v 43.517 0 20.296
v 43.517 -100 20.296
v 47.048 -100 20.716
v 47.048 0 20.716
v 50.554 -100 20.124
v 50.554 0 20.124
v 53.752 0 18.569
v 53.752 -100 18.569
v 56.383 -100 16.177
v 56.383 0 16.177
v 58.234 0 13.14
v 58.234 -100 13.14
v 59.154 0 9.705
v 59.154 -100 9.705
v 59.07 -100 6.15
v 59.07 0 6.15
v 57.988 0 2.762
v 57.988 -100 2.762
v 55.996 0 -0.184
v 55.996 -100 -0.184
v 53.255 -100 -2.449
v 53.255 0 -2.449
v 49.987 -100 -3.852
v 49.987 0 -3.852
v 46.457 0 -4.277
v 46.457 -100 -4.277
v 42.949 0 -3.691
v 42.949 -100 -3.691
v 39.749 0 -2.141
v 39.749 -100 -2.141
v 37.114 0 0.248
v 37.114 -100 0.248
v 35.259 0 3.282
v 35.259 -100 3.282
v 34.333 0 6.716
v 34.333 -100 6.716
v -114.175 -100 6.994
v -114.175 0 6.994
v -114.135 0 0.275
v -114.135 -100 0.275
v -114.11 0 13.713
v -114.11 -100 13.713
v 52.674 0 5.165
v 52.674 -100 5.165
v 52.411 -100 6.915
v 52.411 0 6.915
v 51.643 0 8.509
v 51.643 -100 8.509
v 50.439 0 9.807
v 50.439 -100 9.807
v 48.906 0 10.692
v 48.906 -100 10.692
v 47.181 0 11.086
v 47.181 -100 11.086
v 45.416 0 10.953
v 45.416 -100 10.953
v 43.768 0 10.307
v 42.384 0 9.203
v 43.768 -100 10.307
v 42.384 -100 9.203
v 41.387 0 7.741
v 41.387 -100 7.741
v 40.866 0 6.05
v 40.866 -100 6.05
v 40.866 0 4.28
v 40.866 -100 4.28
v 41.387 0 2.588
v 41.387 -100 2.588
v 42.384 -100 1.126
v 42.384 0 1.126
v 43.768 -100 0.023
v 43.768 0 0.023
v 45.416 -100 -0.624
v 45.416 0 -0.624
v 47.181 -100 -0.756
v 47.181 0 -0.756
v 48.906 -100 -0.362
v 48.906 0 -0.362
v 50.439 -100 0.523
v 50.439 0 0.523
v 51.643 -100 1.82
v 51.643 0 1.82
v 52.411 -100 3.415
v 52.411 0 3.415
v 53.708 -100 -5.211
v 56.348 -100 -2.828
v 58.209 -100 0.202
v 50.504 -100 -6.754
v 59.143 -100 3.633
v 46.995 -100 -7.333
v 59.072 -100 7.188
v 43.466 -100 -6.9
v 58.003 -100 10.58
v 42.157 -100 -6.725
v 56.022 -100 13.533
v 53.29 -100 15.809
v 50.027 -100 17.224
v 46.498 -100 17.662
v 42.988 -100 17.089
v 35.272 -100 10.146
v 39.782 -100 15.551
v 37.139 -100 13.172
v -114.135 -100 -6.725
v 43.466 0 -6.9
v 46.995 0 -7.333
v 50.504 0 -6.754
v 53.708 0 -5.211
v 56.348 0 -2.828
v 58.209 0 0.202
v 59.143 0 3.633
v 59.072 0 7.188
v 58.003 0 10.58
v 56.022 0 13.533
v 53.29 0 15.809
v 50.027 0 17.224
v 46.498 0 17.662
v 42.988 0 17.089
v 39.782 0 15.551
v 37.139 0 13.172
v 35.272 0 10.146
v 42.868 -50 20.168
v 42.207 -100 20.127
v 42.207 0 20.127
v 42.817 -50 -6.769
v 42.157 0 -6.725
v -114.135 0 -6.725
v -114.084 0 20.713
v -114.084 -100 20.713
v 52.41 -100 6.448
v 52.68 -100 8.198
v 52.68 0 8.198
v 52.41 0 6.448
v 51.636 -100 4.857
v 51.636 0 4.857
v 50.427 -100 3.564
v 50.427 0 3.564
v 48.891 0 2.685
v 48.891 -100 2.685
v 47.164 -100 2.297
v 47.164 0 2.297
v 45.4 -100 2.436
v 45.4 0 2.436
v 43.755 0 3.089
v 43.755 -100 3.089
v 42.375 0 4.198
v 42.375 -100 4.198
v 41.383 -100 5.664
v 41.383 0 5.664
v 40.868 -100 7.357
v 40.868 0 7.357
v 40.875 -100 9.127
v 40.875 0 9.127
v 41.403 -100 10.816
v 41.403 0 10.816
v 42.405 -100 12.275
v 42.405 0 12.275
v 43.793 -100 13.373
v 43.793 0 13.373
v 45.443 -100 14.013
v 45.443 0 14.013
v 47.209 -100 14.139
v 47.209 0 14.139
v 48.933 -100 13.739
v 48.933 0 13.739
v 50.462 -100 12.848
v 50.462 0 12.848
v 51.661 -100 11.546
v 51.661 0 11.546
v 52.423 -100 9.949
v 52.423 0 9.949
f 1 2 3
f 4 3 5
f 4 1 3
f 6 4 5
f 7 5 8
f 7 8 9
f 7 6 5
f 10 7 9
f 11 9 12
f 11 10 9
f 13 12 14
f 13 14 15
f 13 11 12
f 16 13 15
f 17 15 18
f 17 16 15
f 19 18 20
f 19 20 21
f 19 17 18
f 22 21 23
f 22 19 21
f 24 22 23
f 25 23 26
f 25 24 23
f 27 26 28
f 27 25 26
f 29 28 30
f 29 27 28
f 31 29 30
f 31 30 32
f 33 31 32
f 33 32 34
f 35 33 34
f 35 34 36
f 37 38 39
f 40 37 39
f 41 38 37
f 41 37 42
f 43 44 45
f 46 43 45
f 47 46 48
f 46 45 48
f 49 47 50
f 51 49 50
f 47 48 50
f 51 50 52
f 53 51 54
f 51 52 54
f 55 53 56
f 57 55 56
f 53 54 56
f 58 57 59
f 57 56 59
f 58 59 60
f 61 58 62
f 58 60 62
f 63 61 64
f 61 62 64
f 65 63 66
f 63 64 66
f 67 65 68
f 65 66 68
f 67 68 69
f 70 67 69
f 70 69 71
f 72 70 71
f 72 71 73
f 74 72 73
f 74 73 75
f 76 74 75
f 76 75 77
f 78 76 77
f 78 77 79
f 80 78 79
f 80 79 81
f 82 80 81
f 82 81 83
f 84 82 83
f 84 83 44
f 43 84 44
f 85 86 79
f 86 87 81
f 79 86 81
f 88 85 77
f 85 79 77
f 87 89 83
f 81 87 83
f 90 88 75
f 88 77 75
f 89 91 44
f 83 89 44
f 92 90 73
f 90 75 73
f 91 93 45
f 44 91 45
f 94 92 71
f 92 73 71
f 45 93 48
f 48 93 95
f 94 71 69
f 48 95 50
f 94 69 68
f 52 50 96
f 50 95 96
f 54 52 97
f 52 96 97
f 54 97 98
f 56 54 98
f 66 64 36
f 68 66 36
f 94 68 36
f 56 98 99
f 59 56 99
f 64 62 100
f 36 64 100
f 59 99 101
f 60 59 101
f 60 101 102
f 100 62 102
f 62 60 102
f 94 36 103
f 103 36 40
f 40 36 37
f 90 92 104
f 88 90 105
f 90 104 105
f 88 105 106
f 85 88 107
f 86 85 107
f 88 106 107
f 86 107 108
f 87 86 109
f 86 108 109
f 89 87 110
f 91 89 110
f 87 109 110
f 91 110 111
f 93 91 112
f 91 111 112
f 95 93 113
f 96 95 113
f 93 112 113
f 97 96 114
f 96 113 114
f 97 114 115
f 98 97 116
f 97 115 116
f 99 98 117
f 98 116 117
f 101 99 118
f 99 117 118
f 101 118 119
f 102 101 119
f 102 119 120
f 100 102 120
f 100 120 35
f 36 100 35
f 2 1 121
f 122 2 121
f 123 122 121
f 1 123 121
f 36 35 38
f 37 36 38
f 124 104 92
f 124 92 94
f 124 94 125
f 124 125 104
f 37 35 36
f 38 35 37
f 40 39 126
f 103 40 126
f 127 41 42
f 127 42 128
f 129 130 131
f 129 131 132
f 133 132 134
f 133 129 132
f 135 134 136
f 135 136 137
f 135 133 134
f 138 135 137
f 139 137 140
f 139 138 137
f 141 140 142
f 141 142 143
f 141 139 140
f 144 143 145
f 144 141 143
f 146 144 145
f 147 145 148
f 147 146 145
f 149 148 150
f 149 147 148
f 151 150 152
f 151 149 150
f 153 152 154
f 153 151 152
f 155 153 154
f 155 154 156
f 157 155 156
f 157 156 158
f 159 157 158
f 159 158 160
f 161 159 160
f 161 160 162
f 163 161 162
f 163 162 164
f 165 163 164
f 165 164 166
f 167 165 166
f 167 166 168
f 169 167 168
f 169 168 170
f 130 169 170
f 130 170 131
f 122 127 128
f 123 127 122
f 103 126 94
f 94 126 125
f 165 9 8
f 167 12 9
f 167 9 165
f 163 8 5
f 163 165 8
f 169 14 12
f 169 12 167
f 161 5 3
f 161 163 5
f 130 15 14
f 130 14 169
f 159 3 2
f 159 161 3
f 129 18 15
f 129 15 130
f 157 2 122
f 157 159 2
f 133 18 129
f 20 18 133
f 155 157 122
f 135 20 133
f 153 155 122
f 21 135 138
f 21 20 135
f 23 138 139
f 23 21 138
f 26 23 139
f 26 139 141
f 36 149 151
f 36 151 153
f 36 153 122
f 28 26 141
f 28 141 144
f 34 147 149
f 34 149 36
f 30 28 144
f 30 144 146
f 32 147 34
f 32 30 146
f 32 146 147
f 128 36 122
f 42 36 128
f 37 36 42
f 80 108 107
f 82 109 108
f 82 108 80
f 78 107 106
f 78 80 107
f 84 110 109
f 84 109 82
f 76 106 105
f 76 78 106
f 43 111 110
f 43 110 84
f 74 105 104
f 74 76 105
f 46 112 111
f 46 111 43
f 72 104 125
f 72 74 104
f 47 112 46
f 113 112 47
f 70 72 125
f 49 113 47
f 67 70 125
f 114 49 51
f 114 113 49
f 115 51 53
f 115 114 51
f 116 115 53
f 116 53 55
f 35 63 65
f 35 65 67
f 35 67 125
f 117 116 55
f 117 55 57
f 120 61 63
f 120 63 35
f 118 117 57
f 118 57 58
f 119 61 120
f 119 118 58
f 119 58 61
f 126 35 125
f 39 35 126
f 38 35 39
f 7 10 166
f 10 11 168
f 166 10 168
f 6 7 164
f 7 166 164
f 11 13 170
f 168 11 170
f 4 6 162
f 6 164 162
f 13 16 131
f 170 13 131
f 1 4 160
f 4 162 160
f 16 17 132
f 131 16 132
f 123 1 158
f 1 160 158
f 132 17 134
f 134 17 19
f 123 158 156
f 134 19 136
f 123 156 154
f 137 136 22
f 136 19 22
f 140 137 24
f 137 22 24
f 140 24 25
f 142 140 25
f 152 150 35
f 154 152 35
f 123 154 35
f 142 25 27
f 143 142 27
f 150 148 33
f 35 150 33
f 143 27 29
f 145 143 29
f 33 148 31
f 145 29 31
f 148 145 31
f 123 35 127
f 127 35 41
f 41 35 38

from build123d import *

# Parameters (mm, degrees)
F1_DEPTH    = 100
F2_T1_DEPTH = 100
F3_R        = 5.9375424291
F4_DEPTH    = 167.9


# Not quite as in the source:
# - a fillet or chamfer that OpenCascade refuses, or shapes differently, is made with other operations: its cross-section is extruded or revolved along the edge and cut away or added


with BuildPart() as f1:
    # F0 (on Front) → F1 (new body)
    with BuildSketch(Plane.XZ):
        with BuildLine():
            Line((-114.1351125863, -6.7254188471), (36.1845269799, -6.7254188471))
            Line((36.1845269799, -6.7254188471), (42.8799907786, -6.7254188471))
            ThreePointArc((42.8799907786, -6.7254188471), (57.28511127, 11.8717971065), (34.3334955709, 6.7155121653))
            Line((34.3334955709, 6.7155121653), (-114.1748427859, 6.9940946996))
            Line((-114.1748427859, 6.9940946996), (-114.1351125863, 0.2745811529))
            Line((-114.1351125863, 0.2745811529), (-114.1351125863, -6.7254188471))
        make_face()
    extrude(amount=F1_DEPTH)

    # F2: fillet of radius 5 on 1 edges, made by hand

    # F2_s2 → F2_t1 (join)
    with BuildSketch(Plane.XZ):
        with BuildLine():
            add(Edge.make_bspline(
                [(43.4655953072, -6.8996803378), (42.8229343795, -6.7254188471), (42.1570664233, -6.7254188471)],
                knots=[0, 0, 0, 1, 1, 1], degree=2, weights=[1, 1, 1]))
            Line((42.1570664233, -6.7254188471), (42.8799907786, -6.7254188471))
            ThreePointArc((42.8799907786, -6.7254188471), (43.1717281765, -6.8161280686), (43.4655953072, -6.8996803378))
        make_face()
    extrude(amount=F2_T1_DEPTH)

    # F3 (on face) → F4 (cut)
    with BuildSketch(Plane.XZ.offset(100)):
        with Locations((46.7369175169, 5.1646659355)):
            Circle(F3_R)
    extrude(amount=-F4_DEPTH, mode=Mode.SUBTRACT)


with BuildPart() as f5_1:
    # F5: instance of F1
    add(f1.part.mirror(Plane(origin=(-39.9206736075, -50, 6.8548034325), x_dir=(1, 0, 0), z_dir=(0.001875868, 0, 0.9999982406))))


solid = Compound([f1.part, f5_1.part])
